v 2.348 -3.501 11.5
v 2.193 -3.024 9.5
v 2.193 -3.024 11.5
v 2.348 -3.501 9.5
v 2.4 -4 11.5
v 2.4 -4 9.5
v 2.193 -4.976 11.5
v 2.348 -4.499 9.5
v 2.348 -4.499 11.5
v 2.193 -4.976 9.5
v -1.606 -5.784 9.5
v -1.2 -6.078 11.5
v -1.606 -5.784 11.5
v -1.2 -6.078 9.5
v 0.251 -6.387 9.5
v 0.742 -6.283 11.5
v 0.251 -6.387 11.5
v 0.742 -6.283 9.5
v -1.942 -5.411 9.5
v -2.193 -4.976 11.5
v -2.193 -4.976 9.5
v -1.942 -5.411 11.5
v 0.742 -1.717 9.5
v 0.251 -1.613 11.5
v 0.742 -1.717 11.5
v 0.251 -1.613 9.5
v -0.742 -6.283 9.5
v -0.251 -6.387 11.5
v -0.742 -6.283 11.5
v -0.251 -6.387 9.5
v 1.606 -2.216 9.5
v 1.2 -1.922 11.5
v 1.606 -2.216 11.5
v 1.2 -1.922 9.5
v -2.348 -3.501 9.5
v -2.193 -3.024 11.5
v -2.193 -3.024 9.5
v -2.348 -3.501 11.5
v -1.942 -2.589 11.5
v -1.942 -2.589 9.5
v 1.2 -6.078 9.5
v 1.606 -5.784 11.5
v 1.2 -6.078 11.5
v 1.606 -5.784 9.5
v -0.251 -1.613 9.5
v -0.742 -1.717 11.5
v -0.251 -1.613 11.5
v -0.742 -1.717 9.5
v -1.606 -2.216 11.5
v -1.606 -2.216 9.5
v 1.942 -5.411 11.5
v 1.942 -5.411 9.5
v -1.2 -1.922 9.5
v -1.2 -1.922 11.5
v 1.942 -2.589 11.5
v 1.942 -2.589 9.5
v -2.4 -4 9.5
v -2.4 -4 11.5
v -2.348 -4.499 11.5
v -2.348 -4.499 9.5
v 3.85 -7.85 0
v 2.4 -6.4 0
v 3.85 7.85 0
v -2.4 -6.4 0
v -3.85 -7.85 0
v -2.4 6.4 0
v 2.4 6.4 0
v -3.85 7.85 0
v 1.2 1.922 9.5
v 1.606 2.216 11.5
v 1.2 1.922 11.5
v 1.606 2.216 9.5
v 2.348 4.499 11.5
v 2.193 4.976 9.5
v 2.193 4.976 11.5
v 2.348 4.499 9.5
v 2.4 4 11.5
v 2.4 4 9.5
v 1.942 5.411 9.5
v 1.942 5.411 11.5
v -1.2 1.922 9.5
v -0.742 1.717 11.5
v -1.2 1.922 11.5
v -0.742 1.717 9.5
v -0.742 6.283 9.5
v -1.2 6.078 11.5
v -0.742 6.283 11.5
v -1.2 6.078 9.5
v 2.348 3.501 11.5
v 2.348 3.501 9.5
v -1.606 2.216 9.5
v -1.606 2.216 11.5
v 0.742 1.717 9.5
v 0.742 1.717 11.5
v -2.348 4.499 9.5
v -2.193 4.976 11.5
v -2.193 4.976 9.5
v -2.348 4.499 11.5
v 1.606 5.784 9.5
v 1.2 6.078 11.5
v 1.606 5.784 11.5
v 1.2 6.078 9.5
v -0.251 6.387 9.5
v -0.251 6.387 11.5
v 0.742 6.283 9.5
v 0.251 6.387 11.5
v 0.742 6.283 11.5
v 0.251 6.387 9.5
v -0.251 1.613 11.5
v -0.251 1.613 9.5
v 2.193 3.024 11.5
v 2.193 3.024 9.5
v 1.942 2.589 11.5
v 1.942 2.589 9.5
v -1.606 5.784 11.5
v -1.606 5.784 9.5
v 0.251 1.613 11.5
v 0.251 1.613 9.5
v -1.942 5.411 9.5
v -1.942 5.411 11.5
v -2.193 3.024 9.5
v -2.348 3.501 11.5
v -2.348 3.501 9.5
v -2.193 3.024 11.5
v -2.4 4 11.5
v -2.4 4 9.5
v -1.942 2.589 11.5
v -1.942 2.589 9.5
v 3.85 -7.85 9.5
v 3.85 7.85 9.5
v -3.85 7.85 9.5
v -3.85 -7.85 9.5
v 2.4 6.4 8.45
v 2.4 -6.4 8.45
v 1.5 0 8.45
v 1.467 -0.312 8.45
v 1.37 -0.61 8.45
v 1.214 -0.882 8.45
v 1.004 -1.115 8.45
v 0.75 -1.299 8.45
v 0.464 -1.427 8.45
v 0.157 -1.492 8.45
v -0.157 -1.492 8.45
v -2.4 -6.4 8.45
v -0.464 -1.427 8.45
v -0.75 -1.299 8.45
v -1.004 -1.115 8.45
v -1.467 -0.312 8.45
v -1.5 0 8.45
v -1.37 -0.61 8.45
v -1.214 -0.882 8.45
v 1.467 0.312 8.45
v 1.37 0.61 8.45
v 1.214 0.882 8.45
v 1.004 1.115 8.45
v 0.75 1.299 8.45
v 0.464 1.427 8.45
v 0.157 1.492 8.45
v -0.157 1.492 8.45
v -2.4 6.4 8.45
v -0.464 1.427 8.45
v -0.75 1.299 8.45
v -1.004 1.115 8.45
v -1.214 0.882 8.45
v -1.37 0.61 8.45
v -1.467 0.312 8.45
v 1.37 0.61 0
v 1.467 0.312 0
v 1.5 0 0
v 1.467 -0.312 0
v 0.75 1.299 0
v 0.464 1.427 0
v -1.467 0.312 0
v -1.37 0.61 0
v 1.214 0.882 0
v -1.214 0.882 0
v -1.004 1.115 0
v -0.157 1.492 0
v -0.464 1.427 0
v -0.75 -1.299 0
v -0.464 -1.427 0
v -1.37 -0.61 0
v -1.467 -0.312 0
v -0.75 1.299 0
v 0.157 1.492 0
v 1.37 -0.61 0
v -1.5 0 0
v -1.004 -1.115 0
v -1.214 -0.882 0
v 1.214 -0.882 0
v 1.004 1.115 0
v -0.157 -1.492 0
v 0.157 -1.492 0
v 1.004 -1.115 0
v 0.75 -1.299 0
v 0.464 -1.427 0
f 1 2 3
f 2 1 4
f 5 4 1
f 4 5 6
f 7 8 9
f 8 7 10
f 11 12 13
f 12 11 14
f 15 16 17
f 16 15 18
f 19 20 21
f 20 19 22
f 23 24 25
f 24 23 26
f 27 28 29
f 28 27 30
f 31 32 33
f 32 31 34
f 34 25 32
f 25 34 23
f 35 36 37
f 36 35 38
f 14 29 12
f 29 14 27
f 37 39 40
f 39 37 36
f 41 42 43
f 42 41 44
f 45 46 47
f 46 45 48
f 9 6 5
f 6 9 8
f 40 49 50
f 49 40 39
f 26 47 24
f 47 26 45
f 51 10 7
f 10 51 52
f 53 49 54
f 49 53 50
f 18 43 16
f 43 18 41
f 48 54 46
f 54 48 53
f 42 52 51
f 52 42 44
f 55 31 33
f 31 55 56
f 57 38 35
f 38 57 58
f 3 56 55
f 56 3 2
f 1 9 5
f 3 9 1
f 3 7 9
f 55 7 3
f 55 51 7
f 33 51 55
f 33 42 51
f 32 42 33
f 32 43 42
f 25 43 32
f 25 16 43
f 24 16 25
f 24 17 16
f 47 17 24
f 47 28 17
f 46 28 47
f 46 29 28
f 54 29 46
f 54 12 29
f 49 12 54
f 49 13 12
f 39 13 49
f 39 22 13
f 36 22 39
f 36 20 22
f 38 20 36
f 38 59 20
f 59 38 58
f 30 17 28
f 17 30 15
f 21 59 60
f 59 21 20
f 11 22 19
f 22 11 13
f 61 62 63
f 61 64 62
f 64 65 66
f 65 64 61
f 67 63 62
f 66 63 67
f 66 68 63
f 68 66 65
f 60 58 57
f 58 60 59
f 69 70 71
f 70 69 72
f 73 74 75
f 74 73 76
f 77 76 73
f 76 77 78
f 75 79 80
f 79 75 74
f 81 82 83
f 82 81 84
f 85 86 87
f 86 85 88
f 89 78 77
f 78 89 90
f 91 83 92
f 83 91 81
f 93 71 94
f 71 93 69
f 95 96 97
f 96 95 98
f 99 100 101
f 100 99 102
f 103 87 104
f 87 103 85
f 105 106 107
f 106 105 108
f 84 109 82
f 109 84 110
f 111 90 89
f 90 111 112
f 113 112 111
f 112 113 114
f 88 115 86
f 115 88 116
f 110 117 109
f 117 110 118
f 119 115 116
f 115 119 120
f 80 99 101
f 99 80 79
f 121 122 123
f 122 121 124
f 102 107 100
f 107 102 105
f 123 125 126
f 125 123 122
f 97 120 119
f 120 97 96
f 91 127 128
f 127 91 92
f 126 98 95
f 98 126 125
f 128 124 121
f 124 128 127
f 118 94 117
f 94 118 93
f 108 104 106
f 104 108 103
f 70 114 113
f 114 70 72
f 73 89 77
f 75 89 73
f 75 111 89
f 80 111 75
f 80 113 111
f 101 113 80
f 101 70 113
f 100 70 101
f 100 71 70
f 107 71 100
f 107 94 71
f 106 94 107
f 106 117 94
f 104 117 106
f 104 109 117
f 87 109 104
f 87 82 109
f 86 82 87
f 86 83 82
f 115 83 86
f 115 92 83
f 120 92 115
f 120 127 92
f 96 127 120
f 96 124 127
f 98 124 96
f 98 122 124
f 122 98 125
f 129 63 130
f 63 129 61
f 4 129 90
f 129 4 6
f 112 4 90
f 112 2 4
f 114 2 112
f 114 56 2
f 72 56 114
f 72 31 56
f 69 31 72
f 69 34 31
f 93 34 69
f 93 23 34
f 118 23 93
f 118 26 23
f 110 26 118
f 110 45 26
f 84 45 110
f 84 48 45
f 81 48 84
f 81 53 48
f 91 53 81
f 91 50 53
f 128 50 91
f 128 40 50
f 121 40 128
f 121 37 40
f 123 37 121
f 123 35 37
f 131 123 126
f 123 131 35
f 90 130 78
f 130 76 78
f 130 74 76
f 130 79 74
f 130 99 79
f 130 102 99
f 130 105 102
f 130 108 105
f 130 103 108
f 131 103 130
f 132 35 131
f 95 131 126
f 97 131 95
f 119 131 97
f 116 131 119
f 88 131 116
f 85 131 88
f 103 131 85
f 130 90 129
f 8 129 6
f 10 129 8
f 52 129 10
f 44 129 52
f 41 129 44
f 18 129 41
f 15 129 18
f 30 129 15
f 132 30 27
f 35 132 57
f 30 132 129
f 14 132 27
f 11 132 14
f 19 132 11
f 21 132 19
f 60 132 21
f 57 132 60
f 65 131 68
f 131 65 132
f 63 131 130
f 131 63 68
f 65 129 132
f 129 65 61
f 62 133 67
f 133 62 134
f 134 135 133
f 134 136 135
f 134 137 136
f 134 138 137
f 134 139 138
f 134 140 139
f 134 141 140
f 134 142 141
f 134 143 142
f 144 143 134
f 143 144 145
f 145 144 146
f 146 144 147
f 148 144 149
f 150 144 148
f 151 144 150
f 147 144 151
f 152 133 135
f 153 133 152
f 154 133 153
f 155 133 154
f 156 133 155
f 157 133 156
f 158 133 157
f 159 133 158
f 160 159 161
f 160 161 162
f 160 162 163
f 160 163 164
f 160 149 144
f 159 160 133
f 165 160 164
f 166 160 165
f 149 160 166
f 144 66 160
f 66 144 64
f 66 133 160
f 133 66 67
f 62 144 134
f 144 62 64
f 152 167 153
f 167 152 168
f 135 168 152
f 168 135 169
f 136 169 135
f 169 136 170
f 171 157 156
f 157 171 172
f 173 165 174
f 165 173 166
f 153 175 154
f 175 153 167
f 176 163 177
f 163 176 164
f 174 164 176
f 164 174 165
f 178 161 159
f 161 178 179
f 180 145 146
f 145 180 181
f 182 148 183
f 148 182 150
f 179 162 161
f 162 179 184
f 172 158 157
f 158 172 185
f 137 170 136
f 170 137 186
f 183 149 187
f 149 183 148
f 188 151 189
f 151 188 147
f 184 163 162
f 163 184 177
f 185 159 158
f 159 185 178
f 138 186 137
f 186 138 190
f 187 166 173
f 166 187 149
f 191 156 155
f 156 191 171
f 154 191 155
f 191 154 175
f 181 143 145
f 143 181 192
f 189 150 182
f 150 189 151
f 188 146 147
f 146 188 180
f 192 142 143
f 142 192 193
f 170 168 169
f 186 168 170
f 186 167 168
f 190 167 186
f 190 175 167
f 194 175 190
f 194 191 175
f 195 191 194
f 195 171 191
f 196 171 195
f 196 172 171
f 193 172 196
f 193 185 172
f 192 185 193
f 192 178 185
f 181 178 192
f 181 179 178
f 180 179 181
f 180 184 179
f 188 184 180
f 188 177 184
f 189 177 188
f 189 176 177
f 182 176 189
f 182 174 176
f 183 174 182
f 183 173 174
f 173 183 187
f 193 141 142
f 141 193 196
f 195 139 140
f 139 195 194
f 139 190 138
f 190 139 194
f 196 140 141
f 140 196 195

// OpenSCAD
// edited 5/7/13 10:07 PM

knob_diameter=4.8;     //knobs on top of blocks
knob_height=2;
knob_spacing=8.0;
wall_thickness=1.45;
roof_thickness=1.05;
block_height=9.5;
pin_diameter=3;        //pin for bottom blocks with width or length of 1
post_diameter=6.5;
reinforcing_width=1.5;
axle_spline_width=2.0;
axle_diameter=5;
cylinder_precision=0.1;

block(2,1,1,axle_hole=false,reinforcement=true);

module block(width,length,height,axle_hole,reinforcement) {
    overall_length=(length-1)*knob_spacing+knob_diameter+wall_thickness*2;
    overall_width=(width-1)*knob_spacing+knob_diameter+wall_thickness*2;
    start=(knob_diameter/2+knob_spacing/2+wall_thickness);
    translate([-overall_length/2,-overall_width/2,0])
        union() {
            difference() {
                union() {
                    cube([overall_length,overall_width,height*block_height]);
                    translate([knob_diameter/2+wall_thickness,knob_diameter/2+wall_thickness,0]) 
                        for (ycount=[0:width-1])
                            for (xcount=[0:length-1]) {
                                translate([xcount*knob_spacing,ycount*knob_spacing,0])
                                    cylinder(r=knob_diameter/2,h=block_height*height+knob_height,$fs=cylinder_precision);
                        }
                }
                translate([wall_thickness,wall_thickness,-roof_thickness]) cube([overall_length-wall_thickness*2,overall_width-wall_thickness*2,block_height*height]);
                if (axle_hole==true)
                    if (width>1 && length>1) for (ycount=[1:width-1])
                        for (xcount=[1:length-1])
                            translate([(xcount-1)*knob_spacing+start,(ycount-1)*knob_spacing+start,-block_height/2])  axle(height+1);
            }
    
            if (reinforcement==true && width>1 && length>1)
                difference() {
                    for (ycount=[1:width-1])
                        for (xcount=[1:length-1])
                            translate([(xcount-1)*knob_spacing+start,(ycount-1)*knob_spacing+start,0]) reinforcement(height);
                    for (ycount=[1:width-1])
                        for (xcount=[1:length-1])
                            translate([(xcount-1)*knob_spacing+start,(ycount-1)*knob_spacing+start,-0.5]) cylinder(r=post_diameter/2-0.1, h=height*block_height+0.5, $fs=cylinder_precision);
                }
    
            if (width>1 && length>1) for (ycount=[1:width-1])
                for (xcount=[1:length-1])
                    translate([(xcount-1)*knob_spacing+start,(ycount-1)*knob_spacing+start,0]) post(height,axle_hole);
    
            if (width==1 && length!=1)
                for (xcount=[1:length-1])
                    translate([(xcount-1)*knob_spacing+start,overall_width/2,0]) cylinder(r=pin_diameter/2,h=block_height*height,$fs=cylinder_precision);
    
            if (length==1 && width!=1)
                for (ycount=[1:width-1])
                    translate([overall_length/2,(ycount-1)*knob_spacing+start,0]) cylinder(r=pin_diameter/2,h=block_height*height,$fs=cylinder_precision);
        }
}

module post(height,axle_hole=false) {
    difference() {
        cylinder(r=post_diameter/2, h=height*block_height,$fs=cylinder_precision);
        if (axle_hole==true) {
            translate([0,0,-block_height/2])
                axle(height+1);
        } else {
            translate([0,0,-0.5])
                cylinder(r=knob_diameter/2, h=height*block_height+1,$fs=cylinder_precision);
        }
    }
}

module reinforcement(height) {
    union() {
        translate([0,0,height*block_height/2]) union() {
            cube([reinforcing_width,knob_spacing+knob_diameter+wall_thickness/2,height*block_height],center=true);
            rotate(v=[0,0,1],a=90) cube([reinforcing_width,knob_spacing+knob_diameter+wall_thickness/2,height*block_height], center=true);
        }
    }
}

module axle(height) {
    translate([0,0,height*block_height/2]) union() {
        cube([axle_diameter,axle_spline_width,height*block_height],center=true);
        cube([axle_spline_width,axle_diameter,height*block_height],center=true);
    }
}
            
